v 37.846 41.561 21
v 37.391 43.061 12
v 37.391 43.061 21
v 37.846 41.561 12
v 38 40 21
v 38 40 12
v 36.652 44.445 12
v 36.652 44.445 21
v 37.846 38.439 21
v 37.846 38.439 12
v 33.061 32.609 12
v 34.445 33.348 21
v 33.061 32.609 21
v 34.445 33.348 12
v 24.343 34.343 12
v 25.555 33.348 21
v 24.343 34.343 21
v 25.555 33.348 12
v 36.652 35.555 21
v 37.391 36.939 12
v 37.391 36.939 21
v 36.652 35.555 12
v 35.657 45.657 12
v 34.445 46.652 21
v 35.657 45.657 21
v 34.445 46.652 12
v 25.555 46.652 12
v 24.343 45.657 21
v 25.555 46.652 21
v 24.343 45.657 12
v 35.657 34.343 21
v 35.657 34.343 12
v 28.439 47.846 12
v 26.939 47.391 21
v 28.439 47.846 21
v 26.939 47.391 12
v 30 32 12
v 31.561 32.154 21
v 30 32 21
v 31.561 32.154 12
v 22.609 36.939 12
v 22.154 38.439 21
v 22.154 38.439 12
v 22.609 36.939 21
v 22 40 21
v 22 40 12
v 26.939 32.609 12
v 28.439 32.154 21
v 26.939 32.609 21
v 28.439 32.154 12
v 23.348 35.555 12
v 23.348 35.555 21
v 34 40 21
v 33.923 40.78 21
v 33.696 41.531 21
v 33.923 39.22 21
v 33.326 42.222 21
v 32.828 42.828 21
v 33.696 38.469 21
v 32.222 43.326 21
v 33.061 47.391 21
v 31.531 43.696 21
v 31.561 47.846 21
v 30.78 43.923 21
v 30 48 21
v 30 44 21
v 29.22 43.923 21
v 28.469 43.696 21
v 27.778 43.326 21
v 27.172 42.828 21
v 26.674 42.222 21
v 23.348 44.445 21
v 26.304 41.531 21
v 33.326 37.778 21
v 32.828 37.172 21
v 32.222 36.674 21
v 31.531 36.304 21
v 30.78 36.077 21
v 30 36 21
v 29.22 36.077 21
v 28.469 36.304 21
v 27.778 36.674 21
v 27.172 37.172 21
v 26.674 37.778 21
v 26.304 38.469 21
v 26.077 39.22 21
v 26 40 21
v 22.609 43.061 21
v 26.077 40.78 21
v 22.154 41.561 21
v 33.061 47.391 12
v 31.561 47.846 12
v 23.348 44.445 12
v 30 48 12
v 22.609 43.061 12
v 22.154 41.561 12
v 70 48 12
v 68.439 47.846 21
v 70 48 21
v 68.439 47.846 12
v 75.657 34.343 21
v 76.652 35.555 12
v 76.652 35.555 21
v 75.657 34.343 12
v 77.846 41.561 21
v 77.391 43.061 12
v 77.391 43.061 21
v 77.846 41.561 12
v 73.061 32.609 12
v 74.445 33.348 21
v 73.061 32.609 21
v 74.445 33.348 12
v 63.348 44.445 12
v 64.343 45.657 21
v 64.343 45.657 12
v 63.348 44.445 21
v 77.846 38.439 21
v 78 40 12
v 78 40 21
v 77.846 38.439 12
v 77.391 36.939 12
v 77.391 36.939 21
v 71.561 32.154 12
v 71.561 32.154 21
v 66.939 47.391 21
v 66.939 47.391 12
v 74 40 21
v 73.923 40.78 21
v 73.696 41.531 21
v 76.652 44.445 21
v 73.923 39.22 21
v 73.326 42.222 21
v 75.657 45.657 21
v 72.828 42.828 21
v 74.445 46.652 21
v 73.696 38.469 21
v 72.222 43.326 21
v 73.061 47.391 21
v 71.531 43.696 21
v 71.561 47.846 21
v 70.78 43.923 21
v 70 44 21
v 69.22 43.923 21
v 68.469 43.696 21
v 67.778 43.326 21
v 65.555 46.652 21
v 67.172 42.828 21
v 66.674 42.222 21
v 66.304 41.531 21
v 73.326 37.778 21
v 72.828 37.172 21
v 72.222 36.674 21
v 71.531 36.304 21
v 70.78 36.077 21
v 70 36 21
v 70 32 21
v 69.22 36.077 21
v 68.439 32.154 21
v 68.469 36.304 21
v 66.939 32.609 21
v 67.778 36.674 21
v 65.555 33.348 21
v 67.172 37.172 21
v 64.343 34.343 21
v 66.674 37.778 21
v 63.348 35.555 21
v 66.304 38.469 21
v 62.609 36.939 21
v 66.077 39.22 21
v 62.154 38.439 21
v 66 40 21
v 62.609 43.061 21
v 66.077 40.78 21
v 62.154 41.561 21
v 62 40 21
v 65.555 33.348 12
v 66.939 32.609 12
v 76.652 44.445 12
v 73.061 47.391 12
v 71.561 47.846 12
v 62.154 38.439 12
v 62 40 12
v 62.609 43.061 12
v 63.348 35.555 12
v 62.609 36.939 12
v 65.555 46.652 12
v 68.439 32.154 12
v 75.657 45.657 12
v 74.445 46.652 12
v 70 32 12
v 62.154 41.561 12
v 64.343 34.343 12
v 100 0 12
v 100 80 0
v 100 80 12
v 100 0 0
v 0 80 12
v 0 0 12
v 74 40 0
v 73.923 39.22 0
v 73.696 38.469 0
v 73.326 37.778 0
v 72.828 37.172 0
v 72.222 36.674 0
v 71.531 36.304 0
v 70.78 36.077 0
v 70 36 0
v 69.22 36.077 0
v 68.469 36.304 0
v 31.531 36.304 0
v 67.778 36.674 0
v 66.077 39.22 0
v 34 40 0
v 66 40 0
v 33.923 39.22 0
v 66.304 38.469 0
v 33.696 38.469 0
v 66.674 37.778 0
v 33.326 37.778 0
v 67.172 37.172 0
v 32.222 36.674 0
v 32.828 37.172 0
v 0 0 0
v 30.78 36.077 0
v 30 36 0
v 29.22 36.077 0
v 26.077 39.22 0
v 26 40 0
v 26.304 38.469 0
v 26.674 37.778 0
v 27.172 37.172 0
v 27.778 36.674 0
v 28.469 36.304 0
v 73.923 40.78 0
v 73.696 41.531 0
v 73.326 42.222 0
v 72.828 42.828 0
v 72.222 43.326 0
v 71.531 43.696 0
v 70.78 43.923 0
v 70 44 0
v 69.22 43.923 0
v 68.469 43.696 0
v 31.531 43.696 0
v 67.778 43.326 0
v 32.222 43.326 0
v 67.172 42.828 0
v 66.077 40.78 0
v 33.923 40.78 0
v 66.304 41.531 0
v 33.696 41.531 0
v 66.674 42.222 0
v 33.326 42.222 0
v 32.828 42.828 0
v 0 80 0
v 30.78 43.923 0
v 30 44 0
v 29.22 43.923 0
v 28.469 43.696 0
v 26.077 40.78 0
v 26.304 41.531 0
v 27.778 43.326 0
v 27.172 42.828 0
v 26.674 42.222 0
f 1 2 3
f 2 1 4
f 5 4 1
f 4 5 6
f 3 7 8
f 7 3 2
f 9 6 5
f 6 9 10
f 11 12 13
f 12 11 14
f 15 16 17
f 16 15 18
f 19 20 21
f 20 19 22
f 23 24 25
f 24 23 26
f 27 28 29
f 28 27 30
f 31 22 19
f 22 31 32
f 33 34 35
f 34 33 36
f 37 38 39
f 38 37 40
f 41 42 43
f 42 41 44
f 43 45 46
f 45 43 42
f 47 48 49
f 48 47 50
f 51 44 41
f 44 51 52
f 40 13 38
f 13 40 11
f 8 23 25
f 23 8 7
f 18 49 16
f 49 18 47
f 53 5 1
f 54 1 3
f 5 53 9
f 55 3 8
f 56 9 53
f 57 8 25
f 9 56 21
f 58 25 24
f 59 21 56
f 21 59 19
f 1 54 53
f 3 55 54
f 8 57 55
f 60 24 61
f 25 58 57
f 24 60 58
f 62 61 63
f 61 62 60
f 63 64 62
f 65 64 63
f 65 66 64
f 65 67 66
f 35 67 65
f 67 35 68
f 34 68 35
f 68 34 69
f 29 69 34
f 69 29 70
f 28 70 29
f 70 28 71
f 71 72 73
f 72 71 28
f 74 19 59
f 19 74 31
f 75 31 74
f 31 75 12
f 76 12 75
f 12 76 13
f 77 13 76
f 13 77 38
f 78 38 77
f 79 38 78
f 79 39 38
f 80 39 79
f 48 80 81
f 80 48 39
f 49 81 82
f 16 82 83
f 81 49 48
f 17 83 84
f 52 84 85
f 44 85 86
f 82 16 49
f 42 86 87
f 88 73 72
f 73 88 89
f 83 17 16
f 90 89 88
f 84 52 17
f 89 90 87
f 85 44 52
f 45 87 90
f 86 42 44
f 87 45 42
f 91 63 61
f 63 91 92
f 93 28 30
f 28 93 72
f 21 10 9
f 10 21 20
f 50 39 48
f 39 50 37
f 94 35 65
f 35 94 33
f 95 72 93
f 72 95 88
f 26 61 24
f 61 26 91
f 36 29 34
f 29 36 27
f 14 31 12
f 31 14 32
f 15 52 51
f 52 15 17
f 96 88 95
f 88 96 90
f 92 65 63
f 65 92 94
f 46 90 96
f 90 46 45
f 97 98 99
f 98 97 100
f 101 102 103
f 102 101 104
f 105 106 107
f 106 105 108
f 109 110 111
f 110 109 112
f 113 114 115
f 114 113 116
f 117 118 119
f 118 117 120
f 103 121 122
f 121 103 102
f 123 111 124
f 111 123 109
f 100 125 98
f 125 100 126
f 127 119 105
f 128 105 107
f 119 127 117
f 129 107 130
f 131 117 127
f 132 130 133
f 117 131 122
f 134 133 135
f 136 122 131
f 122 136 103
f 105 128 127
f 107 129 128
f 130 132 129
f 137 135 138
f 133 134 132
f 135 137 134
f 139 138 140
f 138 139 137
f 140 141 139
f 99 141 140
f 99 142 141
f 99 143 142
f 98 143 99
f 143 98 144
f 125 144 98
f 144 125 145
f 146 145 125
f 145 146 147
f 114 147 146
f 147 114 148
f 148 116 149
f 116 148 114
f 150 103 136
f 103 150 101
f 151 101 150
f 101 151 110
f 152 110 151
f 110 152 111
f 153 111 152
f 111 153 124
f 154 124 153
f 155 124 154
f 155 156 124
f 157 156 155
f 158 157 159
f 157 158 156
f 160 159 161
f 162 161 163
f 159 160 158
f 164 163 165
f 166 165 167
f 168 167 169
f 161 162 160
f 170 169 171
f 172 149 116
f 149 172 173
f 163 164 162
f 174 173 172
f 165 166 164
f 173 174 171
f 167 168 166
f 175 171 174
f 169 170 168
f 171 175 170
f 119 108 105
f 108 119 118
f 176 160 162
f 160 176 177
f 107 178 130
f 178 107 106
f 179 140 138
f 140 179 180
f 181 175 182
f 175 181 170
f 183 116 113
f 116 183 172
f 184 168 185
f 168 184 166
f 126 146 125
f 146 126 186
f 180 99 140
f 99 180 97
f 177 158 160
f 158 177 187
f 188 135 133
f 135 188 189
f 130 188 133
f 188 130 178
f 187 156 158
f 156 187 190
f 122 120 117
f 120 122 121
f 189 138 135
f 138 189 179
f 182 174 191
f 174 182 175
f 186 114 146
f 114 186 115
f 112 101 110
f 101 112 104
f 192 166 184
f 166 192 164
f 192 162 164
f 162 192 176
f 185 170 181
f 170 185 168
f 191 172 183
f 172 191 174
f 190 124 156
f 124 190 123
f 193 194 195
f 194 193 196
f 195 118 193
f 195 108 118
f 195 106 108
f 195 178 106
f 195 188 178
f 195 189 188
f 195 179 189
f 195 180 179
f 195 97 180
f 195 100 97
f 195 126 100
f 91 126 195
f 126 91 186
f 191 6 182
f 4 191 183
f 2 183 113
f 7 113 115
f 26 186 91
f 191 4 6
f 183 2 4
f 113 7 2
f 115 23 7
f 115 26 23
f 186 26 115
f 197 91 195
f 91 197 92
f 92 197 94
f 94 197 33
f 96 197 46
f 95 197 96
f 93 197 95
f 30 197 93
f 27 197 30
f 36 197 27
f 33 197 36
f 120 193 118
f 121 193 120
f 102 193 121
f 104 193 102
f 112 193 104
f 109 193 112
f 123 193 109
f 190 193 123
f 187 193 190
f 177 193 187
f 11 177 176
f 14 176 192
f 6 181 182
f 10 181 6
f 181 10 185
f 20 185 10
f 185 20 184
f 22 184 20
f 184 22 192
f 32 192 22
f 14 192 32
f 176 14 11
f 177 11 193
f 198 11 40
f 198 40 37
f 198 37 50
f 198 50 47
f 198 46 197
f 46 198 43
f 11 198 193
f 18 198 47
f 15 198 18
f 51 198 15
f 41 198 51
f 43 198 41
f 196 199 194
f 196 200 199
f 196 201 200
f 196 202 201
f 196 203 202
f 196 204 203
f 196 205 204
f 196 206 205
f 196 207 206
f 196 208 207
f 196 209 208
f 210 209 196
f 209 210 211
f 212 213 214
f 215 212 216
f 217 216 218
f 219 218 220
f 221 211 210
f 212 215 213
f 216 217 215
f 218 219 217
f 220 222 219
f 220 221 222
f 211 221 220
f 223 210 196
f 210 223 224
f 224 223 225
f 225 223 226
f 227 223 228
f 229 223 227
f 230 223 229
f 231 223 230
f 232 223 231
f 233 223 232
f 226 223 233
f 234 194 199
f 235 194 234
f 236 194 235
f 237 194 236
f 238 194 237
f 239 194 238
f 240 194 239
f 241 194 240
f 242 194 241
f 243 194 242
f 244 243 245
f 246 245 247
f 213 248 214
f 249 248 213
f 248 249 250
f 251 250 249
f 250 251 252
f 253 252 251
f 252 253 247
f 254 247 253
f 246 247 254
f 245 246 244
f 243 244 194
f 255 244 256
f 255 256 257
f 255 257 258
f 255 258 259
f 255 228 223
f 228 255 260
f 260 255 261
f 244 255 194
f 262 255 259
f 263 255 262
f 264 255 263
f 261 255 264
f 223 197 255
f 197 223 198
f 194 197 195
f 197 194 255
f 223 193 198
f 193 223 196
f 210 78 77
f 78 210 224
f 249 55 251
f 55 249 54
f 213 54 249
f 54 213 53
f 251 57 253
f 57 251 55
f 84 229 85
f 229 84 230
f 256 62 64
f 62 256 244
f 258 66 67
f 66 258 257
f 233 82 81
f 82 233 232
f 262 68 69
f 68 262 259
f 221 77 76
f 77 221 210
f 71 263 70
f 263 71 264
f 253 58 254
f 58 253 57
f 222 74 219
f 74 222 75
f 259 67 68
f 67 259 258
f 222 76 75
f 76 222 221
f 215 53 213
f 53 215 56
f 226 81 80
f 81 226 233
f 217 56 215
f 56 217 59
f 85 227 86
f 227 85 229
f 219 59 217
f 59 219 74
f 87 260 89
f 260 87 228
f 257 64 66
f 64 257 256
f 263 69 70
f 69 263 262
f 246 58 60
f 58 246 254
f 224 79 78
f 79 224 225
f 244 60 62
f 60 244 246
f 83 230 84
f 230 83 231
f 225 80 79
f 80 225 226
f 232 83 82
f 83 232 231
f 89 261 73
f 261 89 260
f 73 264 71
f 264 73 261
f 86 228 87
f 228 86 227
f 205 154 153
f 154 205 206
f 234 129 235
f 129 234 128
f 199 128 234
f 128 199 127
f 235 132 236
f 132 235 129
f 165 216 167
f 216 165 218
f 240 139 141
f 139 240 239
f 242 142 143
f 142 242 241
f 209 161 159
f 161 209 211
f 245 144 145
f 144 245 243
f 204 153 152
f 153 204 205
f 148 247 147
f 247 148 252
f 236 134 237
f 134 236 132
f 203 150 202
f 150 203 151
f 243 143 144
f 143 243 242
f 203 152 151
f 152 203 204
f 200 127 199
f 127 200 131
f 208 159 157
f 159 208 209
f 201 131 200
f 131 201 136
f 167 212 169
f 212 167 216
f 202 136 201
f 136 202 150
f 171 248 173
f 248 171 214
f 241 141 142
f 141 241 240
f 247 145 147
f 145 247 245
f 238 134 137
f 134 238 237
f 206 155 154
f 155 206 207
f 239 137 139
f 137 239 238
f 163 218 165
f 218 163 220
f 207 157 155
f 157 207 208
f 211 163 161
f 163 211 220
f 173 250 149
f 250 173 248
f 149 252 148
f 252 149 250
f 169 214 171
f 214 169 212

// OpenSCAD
$fn = 32;

// ----------------------------------------------------------------------
// Drill jig: two_boss jig
// ----------------------------------------------------------------------

// --- parameters (mm) ---
plate_l = 100;            // plate length, X
plate_w = 80;             // plate width, Y
plate_t = 12;             // plate thickness
boss_d = 16;              // guide boss diameter
boss_h = 10;              // boss height above the plate
guide_d = 8;              // guide hole diameter
boss_pitch = 40;          // boss pitch
fit_tol = 0.02;           // tolerance for press fits, mm
free_tol = 0.2;           // tolerance for clearance fits, mm

n_boss = 2;  // guide bosses
boss_x0 = (plate_l - (n_boss - 1) * boss_pitch) / 2;  // first boss X
boss_top = plate_t - 1 + boss_h;  // boss crown height
total_h = boss_top;  // overall height

difference() {
  union() {
  cube([plate_l, plate_w, plate_t]);
  for (i = [0 : n_boss - 1])
    translate([boss_x0 + i * boss_pitch, plate_w / 2, plate_t - 1])
      cylinder(h = boss_h, d = boss_d);
  }
  for (i = [0 : n_boss - 1])
    translate([boss_x0 + i * boss_pitch, plate_w / 2, -1])
      cylinder(h = plate_t + boss_h, d = guide_d);
}
